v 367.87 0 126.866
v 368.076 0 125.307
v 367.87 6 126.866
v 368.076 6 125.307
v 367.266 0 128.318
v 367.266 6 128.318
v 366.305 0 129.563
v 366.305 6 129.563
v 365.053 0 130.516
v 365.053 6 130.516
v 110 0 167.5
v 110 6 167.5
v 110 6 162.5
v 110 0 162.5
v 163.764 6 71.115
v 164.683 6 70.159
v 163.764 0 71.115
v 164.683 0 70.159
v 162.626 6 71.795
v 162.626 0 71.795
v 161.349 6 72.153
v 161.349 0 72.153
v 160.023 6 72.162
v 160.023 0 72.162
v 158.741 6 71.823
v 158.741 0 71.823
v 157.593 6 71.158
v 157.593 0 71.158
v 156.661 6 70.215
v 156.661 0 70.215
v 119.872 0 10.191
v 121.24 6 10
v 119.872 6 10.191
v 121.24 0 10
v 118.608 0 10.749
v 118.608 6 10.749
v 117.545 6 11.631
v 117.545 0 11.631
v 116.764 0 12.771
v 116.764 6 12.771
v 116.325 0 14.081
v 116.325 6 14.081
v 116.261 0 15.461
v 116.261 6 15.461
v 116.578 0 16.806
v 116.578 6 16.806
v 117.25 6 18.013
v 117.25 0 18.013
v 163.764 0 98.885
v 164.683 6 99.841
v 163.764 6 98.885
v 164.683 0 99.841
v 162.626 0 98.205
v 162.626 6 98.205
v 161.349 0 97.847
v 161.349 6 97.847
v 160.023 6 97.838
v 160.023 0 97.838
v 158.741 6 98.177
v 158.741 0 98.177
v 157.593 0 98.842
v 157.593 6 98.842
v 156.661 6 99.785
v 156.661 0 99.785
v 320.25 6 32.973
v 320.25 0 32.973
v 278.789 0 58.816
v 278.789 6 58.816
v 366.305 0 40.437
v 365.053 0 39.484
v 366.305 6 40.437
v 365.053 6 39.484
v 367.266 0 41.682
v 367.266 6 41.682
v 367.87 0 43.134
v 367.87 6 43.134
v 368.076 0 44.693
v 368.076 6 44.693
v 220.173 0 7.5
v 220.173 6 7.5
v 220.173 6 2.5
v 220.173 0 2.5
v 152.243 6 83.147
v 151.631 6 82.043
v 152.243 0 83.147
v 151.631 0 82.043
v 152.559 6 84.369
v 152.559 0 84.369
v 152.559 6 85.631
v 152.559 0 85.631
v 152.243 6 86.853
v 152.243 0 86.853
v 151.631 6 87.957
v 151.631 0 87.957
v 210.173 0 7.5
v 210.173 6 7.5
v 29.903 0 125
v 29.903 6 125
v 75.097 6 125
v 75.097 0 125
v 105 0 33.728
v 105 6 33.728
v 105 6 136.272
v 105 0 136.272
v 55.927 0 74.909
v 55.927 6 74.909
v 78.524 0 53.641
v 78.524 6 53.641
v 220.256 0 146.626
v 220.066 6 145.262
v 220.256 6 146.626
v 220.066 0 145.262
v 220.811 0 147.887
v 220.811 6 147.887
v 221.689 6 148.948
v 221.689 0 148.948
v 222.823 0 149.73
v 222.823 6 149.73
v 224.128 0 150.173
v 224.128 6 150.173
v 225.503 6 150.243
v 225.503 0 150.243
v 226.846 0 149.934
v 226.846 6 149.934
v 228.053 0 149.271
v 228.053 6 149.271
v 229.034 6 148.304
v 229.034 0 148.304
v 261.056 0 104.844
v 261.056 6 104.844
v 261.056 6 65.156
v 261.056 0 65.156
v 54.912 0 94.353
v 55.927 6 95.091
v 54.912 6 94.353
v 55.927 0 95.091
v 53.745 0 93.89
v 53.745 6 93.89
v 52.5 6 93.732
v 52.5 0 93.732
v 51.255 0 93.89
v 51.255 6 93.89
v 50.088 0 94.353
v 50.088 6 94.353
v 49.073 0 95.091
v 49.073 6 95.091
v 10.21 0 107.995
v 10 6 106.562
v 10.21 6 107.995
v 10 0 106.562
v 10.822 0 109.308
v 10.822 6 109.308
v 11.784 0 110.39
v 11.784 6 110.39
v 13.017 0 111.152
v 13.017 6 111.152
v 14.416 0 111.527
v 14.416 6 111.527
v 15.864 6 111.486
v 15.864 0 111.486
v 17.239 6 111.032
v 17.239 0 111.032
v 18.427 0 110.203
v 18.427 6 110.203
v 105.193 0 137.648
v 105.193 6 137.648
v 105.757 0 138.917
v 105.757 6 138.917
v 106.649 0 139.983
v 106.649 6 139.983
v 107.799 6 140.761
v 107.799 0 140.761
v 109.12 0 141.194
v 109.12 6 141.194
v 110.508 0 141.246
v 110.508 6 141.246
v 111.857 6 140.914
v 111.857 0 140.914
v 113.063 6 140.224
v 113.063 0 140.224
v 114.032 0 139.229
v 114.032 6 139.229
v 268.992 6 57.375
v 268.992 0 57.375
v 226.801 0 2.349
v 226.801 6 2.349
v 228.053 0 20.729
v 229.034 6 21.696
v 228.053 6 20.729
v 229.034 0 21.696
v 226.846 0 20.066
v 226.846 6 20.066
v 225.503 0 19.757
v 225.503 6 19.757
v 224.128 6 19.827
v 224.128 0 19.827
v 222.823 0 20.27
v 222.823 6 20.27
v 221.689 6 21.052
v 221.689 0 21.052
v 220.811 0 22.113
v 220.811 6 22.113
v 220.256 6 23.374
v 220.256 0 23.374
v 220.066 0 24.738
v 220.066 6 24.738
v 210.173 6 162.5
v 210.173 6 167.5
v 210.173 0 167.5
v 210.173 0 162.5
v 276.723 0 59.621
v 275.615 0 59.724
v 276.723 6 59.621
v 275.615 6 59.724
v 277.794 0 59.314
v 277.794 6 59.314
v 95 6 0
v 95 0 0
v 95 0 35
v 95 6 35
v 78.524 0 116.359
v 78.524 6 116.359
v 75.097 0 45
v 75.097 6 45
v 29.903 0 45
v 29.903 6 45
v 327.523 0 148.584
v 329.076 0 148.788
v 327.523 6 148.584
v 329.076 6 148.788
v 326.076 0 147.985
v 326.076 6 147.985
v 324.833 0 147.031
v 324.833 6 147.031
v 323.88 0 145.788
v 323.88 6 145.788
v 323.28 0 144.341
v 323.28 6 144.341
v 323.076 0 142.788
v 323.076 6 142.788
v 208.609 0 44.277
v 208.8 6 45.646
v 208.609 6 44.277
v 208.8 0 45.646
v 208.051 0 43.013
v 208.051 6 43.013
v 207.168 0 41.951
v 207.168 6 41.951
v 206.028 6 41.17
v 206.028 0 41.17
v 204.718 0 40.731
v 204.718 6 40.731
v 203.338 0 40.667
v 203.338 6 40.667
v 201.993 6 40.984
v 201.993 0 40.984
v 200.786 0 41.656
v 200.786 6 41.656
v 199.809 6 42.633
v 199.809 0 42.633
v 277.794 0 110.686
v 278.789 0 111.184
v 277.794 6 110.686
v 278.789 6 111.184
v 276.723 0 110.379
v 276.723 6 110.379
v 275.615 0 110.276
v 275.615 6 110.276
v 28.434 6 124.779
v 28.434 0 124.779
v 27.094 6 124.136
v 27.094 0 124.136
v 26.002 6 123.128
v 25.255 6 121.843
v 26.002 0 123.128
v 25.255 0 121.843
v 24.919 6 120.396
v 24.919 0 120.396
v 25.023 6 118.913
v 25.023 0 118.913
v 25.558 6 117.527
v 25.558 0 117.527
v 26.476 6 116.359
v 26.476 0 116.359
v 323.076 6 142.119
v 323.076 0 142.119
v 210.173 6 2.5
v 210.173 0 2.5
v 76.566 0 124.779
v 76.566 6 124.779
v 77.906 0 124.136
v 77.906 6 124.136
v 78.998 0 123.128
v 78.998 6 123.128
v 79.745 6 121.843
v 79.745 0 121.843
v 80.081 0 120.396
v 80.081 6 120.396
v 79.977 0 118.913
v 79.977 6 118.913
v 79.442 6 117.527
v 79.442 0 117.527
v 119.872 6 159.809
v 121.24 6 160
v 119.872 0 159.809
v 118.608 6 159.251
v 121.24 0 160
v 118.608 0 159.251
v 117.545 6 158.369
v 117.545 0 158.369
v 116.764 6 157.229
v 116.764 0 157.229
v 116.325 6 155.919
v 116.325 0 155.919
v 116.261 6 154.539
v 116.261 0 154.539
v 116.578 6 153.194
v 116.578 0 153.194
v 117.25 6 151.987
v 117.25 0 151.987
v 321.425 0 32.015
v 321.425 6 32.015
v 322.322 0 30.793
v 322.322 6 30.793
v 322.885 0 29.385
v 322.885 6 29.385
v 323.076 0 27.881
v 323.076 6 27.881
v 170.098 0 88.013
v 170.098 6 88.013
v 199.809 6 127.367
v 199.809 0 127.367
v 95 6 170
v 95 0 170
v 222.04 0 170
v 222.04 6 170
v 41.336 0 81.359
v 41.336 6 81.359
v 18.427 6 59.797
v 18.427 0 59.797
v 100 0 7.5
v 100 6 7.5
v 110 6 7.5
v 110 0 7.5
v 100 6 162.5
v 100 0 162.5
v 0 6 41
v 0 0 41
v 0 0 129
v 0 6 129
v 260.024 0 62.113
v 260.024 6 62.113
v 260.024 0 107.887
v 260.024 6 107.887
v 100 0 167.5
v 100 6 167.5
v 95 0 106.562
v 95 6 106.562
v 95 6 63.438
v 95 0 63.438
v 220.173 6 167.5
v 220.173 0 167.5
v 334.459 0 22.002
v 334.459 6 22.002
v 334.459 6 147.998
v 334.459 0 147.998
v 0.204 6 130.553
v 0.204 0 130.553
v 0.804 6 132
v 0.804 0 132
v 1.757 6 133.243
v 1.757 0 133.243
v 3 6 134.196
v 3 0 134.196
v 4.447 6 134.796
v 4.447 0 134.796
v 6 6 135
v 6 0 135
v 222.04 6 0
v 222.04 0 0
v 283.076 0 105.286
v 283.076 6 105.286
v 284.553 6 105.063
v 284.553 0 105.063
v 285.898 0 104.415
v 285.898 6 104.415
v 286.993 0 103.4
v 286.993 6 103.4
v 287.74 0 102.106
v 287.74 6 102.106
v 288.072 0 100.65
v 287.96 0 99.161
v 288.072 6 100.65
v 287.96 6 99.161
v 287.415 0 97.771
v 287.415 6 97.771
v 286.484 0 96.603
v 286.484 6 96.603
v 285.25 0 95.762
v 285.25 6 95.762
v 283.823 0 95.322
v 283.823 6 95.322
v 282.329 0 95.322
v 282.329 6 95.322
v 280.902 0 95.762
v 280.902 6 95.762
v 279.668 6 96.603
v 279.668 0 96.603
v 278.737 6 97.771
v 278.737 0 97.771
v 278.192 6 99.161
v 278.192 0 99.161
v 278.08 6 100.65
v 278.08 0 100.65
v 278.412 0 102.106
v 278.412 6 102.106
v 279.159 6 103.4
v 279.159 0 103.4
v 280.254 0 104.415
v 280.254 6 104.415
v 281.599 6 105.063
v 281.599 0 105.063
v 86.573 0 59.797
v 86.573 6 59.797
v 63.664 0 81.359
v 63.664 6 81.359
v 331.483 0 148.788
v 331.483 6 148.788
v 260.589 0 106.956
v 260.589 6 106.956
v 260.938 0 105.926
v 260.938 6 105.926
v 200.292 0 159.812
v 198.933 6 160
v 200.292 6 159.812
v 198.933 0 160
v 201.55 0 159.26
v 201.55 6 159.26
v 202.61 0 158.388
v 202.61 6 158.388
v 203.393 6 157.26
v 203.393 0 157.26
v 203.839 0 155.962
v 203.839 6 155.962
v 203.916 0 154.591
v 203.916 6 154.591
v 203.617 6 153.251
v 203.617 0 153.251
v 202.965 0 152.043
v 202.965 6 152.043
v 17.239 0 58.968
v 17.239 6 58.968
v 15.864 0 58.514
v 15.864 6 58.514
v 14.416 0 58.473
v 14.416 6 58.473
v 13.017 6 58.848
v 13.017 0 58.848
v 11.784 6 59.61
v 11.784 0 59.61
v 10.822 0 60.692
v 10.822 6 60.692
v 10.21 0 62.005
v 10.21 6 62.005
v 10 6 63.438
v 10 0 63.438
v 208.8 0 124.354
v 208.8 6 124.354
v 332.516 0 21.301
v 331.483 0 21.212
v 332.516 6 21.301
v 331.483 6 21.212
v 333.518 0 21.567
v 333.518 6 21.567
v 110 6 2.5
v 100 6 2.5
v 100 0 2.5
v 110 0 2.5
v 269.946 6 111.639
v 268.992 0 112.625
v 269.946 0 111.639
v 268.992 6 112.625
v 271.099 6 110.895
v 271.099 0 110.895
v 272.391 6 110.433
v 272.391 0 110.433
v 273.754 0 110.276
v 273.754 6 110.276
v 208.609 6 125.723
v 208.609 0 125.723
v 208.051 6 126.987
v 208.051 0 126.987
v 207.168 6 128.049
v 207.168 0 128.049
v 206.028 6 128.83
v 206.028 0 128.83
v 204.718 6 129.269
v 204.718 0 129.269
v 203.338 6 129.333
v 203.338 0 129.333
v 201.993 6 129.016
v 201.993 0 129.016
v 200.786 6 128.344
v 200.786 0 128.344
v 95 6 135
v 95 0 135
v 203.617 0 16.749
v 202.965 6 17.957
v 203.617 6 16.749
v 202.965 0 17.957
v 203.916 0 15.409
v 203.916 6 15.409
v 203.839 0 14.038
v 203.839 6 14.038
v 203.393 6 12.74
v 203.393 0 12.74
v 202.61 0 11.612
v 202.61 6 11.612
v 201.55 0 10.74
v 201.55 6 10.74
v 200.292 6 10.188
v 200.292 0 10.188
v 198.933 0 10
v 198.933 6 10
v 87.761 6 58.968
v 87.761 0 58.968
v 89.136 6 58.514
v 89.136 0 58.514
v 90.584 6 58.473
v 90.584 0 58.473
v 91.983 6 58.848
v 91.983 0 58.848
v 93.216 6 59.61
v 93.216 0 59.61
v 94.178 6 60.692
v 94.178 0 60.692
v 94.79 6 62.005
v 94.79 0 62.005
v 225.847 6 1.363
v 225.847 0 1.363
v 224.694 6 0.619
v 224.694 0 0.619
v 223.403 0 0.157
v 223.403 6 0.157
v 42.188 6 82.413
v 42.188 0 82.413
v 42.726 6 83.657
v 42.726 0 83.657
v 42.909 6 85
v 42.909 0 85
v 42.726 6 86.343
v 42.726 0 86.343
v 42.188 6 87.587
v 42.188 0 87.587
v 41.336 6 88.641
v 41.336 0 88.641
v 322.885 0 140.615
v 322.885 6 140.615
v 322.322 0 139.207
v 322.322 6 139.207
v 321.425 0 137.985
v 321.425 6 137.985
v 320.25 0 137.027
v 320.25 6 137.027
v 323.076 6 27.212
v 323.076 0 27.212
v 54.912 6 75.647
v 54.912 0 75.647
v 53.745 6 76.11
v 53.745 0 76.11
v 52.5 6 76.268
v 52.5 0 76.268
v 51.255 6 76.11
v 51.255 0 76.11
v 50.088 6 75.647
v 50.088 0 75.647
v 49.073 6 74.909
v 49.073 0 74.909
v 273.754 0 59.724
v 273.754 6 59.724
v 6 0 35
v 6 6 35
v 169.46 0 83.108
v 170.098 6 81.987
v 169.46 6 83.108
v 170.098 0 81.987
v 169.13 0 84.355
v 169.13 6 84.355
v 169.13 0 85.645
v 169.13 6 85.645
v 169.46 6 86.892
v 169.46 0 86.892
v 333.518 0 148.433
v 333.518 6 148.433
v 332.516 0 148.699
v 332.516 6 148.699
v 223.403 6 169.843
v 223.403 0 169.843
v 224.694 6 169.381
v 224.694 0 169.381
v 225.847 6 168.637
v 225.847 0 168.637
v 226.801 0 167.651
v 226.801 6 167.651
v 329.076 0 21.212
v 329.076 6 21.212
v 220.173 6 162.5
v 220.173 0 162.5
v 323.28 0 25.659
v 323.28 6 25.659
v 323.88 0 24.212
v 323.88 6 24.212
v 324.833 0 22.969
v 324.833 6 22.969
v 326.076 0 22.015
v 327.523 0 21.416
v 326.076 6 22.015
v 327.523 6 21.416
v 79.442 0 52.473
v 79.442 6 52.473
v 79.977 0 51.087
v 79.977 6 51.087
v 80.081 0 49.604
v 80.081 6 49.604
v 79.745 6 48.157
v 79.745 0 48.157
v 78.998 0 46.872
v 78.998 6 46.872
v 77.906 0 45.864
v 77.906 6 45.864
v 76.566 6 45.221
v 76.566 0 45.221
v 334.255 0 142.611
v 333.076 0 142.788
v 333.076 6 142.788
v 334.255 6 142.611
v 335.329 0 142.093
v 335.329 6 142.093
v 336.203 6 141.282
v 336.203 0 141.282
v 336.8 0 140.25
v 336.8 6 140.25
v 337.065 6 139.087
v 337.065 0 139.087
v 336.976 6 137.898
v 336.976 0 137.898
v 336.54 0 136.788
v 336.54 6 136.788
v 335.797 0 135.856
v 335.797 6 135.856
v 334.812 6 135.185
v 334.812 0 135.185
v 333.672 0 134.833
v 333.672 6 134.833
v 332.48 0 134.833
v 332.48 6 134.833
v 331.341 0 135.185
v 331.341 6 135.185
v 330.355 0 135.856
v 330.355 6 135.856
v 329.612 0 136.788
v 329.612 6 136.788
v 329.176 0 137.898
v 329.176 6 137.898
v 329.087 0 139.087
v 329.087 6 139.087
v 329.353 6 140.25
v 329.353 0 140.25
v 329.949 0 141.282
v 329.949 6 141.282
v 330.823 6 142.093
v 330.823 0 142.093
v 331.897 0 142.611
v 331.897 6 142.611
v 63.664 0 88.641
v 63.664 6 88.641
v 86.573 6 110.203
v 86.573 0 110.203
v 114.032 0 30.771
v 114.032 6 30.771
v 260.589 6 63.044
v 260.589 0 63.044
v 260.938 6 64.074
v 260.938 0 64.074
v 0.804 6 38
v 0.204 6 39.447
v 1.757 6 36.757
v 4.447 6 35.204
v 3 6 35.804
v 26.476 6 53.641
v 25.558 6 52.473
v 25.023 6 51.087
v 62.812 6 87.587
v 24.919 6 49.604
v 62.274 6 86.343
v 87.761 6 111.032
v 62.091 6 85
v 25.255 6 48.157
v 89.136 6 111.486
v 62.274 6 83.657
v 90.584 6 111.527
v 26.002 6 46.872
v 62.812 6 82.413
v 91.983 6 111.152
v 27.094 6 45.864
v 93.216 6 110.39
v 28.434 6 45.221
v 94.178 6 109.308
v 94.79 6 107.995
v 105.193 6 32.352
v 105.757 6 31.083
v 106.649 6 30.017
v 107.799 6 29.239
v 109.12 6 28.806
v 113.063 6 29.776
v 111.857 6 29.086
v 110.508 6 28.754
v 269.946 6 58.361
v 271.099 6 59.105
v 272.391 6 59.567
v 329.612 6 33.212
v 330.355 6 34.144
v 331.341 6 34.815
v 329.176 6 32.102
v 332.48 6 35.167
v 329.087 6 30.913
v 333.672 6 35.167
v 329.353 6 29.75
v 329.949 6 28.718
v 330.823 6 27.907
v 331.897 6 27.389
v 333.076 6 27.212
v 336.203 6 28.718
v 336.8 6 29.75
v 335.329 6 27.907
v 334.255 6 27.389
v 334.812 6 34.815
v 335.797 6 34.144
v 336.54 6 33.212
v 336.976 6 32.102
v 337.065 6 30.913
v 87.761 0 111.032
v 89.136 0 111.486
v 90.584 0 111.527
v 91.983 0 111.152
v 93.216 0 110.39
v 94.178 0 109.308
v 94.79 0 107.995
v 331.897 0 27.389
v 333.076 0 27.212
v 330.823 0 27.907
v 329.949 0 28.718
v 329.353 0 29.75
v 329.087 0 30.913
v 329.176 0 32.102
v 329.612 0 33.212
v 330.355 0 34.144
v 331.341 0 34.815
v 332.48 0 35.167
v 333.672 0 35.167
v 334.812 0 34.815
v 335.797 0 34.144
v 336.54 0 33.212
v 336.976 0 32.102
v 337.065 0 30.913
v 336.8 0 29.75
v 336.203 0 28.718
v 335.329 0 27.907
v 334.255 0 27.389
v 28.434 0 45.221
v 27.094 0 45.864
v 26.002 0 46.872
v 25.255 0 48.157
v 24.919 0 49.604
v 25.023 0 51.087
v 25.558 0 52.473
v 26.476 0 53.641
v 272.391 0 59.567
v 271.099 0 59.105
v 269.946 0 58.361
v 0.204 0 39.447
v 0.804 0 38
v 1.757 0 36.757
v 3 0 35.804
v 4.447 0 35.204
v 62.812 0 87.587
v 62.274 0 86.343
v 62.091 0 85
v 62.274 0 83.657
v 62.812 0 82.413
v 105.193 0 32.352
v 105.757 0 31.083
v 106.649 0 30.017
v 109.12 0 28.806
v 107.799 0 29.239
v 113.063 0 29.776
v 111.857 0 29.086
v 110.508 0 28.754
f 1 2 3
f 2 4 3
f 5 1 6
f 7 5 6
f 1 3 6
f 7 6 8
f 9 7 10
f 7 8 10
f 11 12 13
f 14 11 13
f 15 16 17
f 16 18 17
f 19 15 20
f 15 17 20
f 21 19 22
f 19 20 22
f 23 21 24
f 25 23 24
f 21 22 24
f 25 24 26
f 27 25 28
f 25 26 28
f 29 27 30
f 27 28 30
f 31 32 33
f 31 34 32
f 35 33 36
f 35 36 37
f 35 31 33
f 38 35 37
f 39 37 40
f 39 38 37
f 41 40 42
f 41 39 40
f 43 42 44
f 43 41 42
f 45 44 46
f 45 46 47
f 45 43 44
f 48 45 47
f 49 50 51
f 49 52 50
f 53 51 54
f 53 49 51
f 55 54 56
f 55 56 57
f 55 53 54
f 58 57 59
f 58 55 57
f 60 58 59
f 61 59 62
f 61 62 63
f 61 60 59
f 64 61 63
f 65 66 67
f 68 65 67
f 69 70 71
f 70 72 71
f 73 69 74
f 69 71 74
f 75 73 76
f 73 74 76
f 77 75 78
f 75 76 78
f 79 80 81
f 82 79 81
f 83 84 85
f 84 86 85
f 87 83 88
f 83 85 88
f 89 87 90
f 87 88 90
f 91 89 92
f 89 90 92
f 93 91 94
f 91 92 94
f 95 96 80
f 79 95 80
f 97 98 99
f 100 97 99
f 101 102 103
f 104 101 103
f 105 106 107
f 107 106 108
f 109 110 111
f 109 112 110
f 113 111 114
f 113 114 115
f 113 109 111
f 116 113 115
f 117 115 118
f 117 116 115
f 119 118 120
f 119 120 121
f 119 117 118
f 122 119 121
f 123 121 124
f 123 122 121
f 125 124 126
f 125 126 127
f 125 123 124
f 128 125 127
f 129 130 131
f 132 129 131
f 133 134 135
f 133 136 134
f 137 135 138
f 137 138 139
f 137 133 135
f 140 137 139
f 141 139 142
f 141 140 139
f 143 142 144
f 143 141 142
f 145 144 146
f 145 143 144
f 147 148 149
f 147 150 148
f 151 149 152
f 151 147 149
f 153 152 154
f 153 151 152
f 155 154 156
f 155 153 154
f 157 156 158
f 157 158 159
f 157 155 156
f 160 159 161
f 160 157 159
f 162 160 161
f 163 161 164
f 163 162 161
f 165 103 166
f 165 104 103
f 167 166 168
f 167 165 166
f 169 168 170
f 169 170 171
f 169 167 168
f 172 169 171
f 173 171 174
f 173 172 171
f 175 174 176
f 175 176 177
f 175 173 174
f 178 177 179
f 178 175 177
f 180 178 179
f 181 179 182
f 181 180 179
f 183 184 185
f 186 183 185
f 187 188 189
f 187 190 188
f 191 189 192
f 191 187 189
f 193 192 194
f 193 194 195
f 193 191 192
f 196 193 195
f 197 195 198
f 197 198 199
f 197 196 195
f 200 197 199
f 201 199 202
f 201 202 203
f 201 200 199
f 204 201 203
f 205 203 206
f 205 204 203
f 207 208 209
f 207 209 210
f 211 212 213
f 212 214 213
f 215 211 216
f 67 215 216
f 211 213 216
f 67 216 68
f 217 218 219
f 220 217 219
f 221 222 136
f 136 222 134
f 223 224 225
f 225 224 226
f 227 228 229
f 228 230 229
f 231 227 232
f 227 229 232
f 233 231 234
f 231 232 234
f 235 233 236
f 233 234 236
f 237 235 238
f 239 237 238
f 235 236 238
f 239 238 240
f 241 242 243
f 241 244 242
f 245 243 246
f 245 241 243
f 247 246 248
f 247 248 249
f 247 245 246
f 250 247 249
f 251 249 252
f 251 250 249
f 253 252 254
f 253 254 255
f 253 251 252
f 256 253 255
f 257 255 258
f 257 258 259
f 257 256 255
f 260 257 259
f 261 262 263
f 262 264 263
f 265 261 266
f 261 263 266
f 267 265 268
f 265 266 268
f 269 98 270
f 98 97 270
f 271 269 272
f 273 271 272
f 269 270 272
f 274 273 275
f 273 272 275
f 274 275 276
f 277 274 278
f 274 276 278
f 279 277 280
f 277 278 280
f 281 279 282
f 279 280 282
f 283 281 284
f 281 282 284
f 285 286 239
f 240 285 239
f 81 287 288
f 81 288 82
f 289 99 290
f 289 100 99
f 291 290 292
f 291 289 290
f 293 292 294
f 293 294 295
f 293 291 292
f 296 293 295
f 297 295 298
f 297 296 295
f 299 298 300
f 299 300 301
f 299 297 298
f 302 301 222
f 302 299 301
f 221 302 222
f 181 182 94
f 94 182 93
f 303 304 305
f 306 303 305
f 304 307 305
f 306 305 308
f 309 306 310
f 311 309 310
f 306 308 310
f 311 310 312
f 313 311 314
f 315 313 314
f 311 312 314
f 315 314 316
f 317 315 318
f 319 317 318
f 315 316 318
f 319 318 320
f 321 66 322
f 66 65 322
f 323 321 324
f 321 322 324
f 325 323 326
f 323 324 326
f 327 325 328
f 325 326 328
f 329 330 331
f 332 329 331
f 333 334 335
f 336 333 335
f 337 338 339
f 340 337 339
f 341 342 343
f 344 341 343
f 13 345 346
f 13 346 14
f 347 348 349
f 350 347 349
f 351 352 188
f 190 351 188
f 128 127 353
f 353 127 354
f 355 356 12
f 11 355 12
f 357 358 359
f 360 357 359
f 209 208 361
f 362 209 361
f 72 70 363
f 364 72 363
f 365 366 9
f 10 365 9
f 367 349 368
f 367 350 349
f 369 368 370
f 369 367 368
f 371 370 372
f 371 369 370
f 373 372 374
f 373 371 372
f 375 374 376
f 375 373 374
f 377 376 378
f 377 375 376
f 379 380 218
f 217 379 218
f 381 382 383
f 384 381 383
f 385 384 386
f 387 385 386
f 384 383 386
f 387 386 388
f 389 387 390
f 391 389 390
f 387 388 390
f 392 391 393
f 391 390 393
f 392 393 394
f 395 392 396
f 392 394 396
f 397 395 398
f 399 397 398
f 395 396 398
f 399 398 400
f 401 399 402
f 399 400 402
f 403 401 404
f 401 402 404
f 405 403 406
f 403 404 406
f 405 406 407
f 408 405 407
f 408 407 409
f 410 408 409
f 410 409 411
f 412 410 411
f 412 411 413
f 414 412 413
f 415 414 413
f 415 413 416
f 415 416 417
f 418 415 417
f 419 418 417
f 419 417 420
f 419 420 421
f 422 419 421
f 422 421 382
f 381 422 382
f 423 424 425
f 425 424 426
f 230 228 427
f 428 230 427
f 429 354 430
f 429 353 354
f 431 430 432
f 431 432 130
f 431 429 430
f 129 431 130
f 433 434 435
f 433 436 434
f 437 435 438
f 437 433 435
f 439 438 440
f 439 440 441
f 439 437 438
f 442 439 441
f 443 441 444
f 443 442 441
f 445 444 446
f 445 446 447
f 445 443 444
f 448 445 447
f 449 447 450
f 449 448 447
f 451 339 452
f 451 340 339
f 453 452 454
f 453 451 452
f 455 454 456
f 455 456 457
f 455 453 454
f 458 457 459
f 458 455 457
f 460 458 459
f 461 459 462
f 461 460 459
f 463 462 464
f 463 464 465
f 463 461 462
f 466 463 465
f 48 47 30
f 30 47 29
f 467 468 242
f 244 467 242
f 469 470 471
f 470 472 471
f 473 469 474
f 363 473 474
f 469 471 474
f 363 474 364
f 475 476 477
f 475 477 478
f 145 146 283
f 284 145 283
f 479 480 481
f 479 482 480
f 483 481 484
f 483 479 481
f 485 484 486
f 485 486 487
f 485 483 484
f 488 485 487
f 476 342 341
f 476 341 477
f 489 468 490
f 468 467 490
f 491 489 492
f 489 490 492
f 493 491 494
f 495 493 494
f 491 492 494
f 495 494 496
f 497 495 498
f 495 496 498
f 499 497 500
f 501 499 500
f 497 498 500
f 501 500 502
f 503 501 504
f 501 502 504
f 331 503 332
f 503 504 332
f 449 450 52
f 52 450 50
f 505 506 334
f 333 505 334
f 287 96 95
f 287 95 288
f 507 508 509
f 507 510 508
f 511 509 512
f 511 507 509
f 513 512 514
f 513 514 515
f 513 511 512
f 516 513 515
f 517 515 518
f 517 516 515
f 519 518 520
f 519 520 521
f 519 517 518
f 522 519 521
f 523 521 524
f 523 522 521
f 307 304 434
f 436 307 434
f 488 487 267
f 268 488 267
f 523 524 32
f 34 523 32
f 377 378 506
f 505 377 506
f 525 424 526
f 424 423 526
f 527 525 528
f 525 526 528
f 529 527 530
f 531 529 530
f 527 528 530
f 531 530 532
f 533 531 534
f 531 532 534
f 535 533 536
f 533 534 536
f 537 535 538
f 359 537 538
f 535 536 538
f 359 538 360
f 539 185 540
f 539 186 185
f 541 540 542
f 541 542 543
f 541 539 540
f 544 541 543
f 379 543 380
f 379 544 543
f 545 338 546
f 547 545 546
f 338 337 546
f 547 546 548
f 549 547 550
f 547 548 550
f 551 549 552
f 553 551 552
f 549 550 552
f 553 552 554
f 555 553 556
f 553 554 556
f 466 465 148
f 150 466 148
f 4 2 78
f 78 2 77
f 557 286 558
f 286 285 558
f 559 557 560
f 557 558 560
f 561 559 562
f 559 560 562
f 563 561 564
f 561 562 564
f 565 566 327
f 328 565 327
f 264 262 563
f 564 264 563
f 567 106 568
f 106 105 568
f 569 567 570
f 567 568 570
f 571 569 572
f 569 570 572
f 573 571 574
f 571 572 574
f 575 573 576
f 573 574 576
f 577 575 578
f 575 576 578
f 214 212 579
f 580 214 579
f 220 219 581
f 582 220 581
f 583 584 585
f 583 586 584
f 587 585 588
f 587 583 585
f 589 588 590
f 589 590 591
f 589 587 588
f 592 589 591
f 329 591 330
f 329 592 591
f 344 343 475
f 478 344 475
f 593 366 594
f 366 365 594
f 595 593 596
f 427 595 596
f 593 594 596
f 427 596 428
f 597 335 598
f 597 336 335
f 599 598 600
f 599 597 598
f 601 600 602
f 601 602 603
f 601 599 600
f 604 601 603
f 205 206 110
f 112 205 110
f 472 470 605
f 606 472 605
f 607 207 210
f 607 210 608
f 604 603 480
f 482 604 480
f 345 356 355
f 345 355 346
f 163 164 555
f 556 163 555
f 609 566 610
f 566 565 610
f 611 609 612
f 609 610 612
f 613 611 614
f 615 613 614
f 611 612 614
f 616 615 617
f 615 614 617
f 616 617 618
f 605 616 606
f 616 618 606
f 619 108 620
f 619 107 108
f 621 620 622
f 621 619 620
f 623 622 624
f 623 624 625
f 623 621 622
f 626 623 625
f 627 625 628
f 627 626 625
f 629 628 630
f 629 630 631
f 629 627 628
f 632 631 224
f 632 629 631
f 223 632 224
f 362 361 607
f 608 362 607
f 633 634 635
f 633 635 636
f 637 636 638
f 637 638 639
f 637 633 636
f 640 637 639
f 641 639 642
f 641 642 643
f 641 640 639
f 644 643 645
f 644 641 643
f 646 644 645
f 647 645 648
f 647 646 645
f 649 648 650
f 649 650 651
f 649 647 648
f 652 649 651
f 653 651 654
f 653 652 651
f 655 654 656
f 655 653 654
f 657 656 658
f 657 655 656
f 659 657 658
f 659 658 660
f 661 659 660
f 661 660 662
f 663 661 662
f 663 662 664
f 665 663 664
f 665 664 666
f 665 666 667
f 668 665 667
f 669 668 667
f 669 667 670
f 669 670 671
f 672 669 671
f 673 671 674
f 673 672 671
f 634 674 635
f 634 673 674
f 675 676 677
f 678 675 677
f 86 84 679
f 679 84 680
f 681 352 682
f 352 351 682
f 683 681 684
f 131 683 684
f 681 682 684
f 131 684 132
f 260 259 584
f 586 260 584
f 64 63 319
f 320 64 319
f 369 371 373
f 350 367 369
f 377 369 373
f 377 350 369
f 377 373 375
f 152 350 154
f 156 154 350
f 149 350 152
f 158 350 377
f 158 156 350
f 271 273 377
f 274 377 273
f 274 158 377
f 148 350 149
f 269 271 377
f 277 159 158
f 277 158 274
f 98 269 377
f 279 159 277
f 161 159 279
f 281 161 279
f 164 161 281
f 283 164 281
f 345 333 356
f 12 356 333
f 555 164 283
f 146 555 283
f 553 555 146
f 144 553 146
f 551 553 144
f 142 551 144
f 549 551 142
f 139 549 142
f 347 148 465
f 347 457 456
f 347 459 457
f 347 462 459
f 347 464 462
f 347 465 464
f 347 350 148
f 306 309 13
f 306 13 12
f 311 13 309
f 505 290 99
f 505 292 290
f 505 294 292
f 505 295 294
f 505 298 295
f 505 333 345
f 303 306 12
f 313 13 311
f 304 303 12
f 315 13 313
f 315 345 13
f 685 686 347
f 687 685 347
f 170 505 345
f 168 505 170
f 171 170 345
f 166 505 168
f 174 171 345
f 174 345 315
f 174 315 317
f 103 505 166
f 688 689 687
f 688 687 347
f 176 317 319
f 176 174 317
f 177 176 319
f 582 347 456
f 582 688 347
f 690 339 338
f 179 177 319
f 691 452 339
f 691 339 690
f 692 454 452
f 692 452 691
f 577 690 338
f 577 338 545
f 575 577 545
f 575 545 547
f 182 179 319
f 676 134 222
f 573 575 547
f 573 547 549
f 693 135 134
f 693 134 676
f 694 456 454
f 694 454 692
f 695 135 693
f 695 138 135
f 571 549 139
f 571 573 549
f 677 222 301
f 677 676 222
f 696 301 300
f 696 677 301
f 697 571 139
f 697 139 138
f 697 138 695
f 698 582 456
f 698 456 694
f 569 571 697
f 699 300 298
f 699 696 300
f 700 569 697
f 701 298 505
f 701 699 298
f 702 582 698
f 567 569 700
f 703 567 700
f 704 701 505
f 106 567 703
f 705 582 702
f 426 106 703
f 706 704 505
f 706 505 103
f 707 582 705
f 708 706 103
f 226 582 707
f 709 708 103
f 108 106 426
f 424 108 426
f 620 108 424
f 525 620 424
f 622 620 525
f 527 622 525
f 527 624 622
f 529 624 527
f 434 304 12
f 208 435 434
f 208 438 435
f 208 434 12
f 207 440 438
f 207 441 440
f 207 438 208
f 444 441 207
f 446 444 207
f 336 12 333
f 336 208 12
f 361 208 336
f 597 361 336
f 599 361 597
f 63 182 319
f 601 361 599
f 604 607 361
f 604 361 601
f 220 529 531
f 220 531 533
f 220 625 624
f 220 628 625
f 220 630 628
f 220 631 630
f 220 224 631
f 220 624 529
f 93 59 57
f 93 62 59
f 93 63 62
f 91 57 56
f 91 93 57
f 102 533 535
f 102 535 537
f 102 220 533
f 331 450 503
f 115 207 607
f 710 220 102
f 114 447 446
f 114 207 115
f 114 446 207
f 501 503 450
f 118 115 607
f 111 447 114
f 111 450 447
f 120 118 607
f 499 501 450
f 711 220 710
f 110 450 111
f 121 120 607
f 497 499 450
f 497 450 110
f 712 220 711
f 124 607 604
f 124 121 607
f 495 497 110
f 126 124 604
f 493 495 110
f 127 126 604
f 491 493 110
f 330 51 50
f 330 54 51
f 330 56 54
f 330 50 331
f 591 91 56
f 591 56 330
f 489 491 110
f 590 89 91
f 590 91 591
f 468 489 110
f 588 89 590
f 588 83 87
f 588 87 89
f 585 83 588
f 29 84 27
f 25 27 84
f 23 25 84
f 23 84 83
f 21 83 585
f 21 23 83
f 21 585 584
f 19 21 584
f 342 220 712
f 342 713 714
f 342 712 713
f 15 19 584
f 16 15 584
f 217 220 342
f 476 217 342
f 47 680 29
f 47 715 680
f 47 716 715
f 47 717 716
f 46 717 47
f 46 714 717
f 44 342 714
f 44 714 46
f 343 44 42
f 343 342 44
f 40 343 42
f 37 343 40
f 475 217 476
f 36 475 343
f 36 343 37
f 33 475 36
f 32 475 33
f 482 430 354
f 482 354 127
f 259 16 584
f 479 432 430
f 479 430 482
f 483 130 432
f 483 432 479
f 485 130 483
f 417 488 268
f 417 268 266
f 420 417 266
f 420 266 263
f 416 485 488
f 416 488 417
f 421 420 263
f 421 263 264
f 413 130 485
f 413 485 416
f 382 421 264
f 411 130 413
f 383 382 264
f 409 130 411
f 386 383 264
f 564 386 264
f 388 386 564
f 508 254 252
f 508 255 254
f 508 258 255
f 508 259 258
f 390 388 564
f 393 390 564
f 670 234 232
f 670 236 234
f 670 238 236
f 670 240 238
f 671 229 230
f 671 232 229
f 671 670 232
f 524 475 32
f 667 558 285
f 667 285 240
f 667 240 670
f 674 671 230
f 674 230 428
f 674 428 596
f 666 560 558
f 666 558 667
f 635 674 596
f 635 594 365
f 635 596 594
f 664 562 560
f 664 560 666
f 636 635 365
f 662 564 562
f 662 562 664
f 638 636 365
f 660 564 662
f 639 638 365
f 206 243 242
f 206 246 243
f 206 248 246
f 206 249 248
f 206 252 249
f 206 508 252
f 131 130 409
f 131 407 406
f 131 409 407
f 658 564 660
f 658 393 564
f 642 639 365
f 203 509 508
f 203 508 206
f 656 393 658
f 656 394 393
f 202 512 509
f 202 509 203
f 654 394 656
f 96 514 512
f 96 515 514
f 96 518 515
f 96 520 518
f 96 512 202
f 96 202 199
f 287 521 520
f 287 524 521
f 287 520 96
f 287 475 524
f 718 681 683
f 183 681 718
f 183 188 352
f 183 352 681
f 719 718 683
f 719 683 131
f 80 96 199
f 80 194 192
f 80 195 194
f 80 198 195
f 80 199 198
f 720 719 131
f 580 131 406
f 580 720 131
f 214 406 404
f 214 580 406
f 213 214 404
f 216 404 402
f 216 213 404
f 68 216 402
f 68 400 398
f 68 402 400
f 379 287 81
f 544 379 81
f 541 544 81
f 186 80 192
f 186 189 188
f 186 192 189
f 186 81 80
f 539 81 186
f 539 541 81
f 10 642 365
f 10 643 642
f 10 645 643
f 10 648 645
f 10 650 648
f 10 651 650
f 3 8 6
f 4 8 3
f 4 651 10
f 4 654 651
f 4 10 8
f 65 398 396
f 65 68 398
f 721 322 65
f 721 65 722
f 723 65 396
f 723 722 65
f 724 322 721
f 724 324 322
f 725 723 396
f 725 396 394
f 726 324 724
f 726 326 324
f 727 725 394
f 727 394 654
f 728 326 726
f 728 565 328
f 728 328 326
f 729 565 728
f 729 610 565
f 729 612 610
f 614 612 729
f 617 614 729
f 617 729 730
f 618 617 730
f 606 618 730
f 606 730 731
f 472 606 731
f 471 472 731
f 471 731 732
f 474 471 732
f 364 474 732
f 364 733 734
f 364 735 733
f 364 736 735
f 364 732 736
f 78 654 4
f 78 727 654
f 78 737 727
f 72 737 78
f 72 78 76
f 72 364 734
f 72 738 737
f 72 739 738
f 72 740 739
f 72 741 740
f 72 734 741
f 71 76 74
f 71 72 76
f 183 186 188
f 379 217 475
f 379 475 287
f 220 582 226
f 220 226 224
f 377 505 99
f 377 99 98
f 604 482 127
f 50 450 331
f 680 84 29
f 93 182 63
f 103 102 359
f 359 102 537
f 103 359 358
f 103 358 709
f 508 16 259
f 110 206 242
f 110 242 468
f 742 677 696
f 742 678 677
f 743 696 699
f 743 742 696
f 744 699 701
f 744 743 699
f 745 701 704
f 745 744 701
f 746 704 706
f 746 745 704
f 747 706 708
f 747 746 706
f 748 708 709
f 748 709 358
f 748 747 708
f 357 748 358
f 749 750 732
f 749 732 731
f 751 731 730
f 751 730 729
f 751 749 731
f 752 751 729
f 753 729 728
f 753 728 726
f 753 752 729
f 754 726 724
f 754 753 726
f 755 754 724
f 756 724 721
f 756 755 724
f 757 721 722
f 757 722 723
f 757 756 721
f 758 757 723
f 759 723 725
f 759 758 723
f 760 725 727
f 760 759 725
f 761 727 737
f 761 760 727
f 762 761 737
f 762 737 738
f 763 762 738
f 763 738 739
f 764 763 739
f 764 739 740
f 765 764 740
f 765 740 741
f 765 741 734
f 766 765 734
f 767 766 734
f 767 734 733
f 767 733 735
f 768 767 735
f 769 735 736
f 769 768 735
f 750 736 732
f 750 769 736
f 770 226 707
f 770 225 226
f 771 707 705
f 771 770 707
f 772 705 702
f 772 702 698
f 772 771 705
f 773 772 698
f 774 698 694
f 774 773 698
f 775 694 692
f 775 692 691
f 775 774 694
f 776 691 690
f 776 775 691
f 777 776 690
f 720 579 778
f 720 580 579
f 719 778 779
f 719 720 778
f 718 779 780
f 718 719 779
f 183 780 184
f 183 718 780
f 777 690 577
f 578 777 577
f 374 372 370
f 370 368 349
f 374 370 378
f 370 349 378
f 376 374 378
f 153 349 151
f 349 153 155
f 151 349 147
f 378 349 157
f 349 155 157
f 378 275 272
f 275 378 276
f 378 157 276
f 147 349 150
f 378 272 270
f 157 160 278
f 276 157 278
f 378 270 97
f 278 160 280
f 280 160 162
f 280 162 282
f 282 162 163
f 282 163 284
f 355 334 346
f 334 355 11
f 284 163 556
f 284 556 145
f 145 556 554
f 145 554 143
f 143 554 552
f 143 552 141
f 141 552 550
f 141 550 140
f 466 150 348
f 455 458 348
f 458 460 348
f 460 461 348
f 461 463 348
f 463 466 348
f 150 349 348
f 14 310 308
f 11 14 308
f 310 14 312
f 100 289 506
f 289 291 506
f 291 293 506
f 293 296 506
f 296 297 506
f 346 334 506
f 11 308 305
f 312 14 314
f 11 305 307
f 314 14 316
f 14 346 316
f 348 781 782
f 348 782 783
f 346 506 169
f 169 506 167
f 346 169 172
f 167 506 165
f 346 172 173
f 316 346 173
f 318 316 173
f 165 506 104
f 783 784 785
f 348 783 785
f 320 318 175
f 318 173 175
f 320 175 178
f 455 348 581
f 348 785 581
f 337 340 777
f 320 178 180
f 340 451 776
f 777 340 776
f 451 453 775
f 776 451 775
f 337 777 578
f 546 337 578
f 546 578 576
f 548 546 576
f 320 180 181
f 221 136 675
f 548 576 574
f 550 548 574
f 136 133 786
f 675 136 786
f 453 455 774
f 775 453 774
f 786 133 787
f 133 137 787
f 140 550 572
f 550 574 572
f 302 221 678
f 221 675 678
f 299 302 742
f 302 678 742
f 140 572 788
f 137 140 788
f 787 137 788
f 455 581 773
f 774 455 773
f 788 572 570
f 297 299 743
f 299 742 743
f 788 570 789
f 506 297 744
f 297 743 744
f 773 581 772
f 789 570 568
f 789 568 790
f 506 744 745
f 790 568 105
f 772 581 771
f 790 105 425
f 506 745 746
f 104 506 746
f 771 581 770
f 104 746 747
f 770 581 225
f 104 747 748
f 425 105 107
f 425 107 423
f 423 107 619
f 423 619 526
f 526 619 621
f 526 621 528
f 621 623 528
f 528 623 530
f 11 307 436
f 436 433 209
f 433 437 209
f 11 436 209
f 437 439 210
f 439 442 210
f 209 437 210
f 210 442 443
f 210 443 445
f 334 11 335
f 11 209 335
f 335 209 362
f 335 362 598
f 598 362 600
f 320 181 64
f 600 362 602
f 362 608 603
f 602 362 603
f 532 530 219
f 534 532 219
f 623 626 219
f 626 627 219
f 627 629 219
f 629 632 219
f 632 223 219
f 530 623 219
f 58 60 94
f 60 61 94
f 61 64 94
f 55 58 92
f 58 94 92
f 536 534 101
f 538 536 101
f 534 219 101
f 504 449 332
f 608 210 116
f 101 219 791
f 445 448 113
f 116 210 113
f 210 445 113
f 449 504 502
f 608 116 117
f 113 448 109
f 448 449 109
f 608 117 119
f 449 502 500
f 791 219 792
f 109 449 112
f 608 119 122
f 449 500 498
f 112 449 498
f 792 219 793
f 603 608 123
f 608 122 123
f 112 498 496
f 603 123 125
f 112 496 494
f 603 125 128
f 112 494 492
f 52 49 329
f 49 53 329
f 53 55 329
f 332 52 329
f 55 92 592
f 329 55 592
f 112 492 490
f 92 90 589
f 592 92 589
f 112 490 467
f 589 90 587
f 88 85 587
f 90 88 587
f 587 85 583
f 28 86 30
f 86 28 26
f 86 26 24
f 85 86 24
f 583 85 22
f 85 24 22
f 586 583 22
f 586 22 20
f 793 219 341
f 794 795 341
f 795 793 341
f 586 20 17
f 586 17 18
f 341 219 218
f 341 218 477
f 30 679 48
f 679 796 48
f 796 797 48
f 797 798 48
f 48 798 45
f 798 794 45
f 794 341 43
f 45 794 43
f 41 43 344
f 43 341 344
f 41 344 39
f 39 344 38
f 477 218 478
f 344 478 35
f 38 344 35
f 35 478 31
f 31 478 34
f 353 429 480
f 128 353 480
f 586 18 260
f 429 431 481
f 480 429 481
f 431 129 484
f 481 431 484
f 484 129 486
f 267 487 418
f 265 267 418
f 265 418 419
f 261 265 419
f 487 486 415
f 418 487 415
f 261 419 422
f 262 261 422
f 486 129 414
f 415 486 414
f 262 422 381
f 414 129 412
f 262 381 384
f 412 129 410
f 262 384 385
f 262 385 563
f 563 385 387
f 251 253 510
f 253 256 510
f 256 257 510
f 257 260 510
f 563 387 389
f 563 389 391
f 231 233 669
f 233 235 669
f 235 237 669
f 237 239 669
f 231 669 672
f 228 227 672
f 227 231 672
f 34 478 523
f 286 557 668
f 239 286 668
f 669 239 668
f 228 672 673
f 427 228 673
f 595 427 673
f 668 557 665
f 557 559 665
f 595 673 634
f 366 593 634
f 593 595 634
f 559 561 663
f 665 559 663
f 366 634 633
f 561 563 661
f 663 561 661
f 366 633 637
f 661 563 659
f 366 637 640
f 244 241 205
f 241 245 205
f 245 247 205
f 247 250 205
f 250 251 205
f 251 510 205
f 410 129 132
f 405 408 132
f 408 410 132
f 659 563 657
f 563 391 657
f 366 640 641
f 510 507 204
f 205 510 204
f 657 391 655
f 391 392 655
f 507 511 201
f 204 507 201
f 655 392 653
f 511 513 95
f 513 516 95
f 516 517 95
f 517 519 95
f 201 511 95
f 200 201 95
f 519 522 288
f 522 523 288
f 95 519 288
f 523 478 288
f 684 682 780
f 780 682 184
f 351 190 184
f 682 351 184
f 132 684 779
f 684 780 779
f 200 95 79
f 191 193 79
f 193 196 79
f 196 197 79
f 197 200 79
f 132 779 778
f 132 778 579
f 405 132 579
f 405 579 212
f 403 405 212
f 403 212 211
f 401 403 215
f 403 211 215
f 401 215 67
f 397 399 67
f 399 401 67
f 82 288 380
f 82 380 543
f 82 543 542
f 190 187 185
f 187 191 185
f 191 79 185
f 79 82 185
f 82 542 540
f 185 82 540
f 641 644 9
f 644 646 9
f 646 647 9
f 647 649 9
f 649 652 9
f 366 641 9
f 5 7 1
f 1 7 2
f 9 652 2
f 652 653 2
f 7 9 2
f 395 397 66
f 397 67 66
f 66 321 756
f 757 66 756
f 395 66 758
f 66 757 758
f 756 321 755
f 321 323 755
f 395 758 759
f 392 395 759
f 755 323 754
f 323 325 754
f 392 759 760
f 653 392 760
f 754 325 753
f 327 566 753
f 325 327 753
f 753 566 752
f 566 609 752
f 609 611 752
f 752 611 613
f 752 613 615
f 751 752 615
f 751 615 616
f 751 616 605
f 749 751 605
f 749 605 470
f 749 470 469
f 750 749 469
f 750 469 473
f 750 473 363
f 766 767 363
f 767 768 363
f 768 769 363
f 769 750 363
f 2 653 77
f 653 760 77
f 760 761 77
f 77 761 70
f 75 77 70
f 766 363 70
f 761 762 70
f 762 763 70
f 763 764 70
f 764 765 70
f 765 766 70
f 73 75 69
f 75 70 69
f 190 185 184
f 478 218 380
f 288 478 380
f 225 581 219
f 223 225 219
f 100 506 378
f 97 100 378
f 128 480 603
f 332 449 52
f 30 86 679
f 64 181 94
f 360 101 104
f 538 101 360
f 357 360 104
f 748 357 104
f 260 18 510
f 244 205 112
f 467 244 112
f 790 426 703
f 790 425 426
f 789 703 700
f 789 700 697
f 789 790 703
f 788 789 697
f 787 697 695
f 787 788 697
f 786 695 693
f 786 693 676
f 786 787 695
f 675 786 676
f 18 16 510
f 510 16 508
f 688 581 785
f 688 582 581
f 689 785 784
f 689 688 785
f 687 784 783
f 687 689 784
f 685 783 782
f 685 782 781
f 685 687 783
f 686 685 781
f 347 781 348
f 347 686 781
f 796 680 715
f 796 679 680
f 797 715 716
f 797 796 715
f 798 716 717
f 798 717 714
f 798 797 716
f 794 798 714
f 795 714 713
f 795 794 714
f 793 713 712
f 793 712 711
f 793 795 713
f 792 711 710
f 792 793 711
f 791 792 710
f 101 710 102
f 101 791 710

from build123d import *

# Parameters (mm, degrees)
SKETCH1_R           = 4
BOSS_EXTRUDE1_DEPTH = 6
FILLET1_R           = 6
CUT_EXTRUDE1_DEPTH  = 6
FILLET3_R           = 5
SKETCH3_R           = 5.01
CUT_EXTRUDE2_DEPTH  = 10
SKETCH4_W           = 10
SKETCH4_H           = 5
CUT_EXTRUDE3_DEPTH  = 10


with BuildPart() as part:
    # Sketch1 → Boss-Extrude1 (new body)
    with BuildSketch(Plane(origin=(0, 0, 0), x_dir=(1, 0, 0), z_dir=(0, 1, 0))):
        Polygon((277.331893801, -59.723964411), (274.249458289, -59.723964411), (270.793440906, -59.723964411), (225, 0), (95, 0), (95, -35), (0, -35), (0, -135), (95, -135), (95, -170), (225, -170), (270.793440906, -110.276035589), (274.249458289, -110.276035589), (277.331893801, -110.276035589), (323.076052888, -138.788463278), (323.076052888, -148.788463278), (333.076052888, -148.788463278), (368.076052888, -128.788463278), (368.076052888, -41.211536722), (333.076052888, -21.211536722), (323.076052888, -21.211536722), (323.076052888, -31.211536722), align=None)
        with Locations(Location((333.076052888, -138.788463278, 0), (0, 0, 270))):
            Circle(SKETCH1_R, mode=Mode.SUBTRACT)
        with Locations(Location((333.076052888, -31.211536722, 0), (0, 0, 90))):
            Circle(SKETCH1_R, mode=Mode.SUBTRACT)
    extrude(amount=BOSS_EXTRUDE1_DEPTH)

    # Fillet1
    fillet1_edges = [part.edges().sort_by_distance(p)[0] for p in [
        (323.076052888, 3, 31.211536722),
        (323.076052888, 3, 21.211536722),
        (333.076052888, 3, 21.211536722),
        (368.076052888, 3, 41.211536722),
        (368.076052888, 3, 128.788463278),
        (333.076052888, 3, 148.788463278),
        (323.076052888, 3, 148.788463278),
        (323.076052888, 3, 138.788463278),
        (277.331893801, 3, 110.276035589),
        (270.793440906, 3, 110.276035589),
        (225, 3, 170),
        (0, 3, 135),
        (0, 3, 35),
        (225, 3, 0),
        (270.793440906, 3, 59.723964411),
        (277.331893801, 3, 59.723964411),
    ]]
    fillet(fillet1_edges, radius=FILLET1_R)

    # Sketch2 → Cut-Extrude1 (cut)
    with BuildSketch(Plane(origin=(0, 6, 0), x_dir=(1, 0, 0), z_dir=(0, 1, 0))):
        Polygon((261.056483321, -63.459547708), (220.066293487, -10), (220.066293487, -160), (261.056483321, -106.540452292), align=None)
        Polygon((160.709522788, -75.577434726), (208.799641587, -10), (111.200358413, -10), align=None)
        Polygon((111.200358413, -160), (208.799641587, -160), (160.709522788, -94.422565274), align=None)
        Polygon((153.799641587, -85), (105, -18.455034199), (105, -151.544965801), align=None)
        Polygon((52.5, -78.133754394), (87.704614044, -45), (17.295385956, -45), align=None)
        Polygon((17.295385956, -125), (87.704614044, -125), (52.5, -91.866245606), align=None)
        Polygon((45.204614044, -85), (10, -51.866245606), (10, -118.133754394), align=None)
        Polygon((95, -51.866245606), (59.795385956, -85), (95, -118.133754394), align=None)
        Polygon((208.799641587, -139.275270598), (208.799641587, -30.724729402), (167.823301101, -85), align=None)
    extrude(amount=-CUT_EXTRUDE1_DEPTH, mode=Mode.SUBTRACT)

    # Fillet3
    fillet3_edges = [part.edges().sort_by_distance(p)[0] for p in [
        (59.795385956, 3, 85),
        (95, 3, 51.866245606),
        (95, 3, 118.133754394),
        (52.5, 3, 78.133754394),
        (17.295385956, 3, 45),
        (87.704614044, 3, 45),
        (105, 3, 18.455034199),
        (153.799641587, 3, 85),
        (105, 3, 151.544965801),
        (111.200358413, 3, 160),
        (160.709522788, 3, 94.422565274),
        (208.799641587, 3, 160),
        (261.056483321, 3, 63.459547708),
        (261.056483321, 3, 106.540452292),
        (220.066293487, 3, 160),
        (220.066293487, 3, 10),
        (208.799641587, 3, 10),
        (160.709522788, 3, 75.577434726),
        (111.200358413, 3, 10),
        (17.295385956, 3, 125),
        (52.5, 3, 91.866245606),
        (87.704614044, 3, 125),
        (10, 3, 51.866245606),
        (45.204614044, 3, 85),
        (10, 3, 118.133754394),
        (167.823301101, 3, 85),
        (208.799641587, 3, 30.724729402),
        (208.799641587, 3, 139.275270598),
    ]]
    fillet(fillet3_edges, radius=FILLET3_R)

    # Sketch3 → Cut-Extrude2 (cut)
    with BuildSketch(Plane(origin=(0, 6, 0), x_dir=(1, 0, 0), z_dir=(0, 1, 0))):
        with Locations(Location((283.076052888, -100.276035589, 0), (0, 0, 270))):
            Circle(SKETCH3_R)
    extrude(amount=-CUT_EXTRUDE2_DEPTH, mode=Mode.SUBTRACT)

    # Sketch4 → Cut-Extrude3 (cut)
    with BuildSketch(Plane(origin=(0, 6, 0), x_dir=(1, 0, 0), z_dir=(0, 1, 0))):
        with Locations((105, -5)):
            Rectangle(SKETCH4_W, SKETCH4_H)
        with Locations((215.172787049, -5)):
            Rectangle(SKETCH4_W, SKETCH4_H)
        with Locations((215.172787049, -165)):
            Rectangle(SKETCH4_W, SKETCH4_H)
        with Locations((105, -165)):
            Rectangle(SKETCH4_W, SKETCH4_H)
    extrude(amount=-CUT_EXTRUDE3_DEPTH, mode=Mode.SUBTRACT)


solid = part.part
